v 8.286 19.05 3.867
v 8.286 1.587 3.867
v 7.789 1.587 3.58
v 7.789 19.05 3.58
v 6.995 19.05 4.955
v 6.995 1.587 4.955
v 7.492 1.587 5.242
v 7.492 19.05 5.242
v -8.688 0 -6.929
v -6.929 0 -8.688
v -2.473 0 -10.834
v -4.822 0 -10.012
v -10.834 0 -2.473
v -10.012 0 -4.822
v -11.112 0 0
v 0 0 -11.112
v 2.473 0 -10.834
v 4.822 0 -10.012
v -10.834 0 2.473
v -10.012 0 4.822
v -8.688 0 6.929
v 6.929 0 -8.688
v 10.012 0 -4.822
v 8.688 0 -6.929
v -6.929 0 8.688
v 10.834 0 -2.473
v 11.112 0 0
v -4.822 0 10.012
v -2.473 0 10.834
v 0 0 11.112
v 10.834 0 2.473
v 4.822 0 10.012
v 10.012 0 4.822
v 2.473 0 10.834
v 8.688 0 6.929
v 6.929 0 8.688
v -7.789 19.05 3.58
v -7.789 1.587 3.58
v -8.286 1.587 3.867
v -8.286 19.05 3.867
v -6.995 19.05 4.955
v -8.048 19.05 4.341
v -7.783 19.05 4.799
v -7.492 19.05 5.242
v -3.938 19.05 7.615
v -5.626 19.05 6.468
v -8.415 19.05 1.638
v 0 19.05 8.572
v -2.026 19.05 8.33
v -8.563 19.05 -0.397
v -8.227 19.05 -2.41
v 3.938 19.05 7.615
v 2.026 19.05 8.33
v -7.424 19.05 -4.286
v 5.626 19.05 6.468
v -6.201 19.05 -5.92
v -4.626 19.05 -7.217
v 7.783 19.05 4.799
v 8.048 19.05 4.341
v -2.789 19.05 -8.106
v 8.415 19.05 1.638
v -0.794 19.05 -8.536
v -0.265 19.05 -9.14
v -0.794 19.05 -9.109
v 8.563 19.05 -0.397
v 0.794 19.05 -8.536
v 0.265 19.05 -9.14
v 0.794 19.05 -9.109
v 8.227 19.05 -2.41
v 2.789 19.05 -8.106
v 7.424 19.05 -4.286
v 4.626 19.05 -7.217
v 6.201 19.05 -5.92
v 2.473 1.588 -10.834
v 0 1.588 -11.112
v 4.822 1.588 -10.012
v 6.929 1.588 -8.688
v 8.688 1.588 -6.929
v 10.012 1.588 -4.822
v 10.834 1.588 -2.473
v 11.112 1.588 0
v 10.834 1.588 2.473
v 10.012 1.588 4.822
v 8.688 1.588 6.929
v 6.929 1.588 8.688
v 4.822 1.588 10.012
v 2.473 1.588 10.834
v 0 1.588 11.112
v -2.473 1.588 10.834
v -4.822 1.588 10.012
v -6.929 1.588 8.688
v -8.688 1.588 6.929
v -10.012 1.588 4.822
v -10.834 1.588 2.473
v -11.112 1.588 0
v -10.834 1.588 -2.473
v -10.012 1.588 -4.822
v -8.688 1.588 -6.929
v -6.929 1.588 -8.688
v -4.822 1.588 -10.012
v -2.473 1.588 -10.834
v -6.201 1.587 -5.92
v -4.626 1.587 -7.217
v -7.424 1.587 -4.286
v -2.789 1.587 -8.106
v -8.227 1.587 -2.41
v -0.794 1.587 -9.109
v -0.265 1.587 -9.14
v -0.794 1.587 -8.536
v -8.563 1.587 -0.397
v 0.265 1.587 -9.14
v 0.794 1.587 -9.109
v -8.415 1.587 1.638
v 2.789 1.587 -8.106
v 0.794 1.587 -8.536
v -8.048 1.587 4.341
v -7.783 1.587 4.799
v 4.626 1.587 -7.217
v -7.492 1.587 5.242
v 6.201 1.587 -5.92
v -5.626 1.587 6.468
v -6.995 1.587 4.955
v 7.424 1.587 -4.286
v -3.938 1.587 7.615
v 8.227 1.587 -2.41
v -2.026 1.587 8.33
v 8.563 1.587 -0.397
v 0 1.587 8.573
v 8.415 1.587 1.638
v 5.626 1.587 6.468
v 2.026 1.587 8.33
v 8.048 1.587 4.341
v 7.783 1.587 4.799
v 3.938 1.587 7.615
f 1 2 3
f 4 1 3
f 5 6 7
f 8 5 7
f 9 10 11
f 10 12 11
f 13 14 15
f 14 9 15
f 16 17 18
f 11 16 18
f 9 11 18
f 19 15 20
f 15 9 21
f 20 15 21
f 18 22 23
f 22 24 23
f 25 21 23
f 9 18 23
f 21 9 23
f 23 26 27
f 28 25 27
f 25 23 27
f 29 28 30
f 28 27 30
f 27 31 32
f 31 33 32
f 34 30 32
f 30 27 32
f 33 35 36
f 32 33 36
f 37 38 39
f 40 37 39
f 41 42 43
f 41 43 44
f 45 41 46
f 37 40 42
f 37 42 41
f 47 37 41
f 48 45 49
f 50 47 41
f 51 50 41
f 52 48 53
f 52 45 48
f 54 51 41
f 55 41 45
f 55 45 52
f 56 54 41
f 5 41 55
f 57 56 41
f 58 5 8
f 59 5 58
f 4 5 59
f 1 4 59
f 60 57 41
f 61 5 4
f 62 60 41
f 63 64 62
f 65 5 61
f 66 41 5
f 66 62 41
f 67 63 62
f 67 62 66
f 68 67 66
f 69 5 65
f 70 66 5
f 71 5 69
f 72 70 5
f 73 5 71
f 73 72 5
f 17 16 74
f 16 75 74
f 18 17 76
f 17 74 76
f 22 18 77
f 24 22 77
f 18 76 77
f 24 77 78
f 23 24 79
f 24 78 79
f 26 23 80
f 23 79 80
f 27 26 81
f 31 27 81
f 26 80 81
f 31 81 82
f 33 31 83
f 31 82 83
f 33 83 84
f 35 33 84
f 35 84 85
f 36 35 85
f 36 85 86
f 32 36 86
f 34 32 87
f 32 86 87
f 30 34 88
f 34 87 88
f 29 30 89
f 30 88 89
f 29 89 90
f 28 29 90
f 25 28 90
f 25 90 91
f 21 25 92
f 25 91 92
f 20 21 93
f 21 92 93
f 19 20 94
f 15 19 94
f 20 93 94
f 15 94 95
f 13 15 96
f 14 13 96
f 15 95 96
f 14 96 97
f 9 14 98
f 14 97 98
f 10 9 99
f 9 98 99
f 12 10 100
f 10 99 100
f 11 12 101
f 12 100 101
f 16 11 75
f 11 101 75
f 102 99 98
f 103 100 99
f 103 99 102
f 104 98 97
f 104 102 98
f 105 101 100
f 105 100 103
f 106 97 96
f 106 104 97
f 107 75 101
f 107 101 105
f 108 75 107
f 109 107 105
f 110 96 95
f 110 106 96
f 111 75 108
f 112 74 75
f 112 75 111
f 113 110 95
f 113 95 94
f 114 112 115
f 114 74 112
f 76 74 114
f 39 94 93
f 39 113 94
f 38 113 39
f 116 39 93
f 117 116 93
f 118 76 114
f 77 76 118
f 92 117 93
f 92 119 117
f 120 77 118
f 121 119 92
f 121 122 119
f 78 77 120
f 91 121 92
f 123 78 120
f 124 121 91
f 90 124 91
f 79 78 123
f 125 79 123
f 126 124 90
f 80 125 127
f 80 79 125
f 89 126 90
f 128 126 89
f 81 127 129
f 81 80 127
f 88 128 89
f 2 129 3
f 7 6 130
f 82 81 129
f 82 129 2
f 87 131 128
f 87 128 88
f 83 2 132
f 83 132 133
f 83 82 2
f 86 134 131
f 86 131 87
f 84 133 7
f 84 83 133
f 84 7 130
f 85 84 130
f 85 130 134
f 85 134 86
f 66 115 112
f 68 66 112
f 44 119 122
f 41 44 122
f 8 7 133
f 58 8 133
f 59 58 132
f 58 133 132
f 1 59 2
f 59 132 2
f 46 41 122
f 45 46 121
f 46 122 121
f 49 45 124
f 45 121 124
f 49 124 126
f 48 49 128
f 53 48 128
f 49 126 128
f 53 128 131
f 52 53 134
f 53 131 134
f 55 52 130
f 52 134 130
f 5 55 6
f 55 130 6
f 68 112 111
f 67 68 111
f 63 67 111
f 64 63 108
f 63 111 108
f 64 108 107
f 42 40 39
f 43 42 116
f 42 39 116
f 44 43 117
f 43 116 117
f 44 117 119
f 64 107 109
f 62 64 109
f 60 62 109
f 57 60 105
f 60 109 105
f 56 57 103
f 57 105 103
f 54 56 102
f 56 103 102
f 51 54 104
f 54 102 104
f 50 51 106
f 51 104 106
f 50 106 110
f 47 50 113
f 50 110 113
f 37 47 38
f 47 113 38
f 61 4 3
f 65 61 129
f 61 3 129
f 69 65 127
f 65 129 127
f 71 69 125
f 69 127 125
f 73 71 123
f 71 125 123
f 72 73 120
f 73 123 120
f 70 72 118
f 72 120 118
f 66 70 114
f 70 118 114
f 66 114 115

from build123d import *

# Parameters (mm, degrees)
BOSS_EXTRUDE1_DEPTH = 19.05
SKETCH6_W           = 0.608326788
SKETCH6_H           = 1.5875
SKETCH8_W           = 2.576826788
SKETCH8_H           = 1.5875


with BuildPart() as part:
    # Sketch1 → Boss-Extrude1 (new body)
    with BuildSketch(Plane(origin=(0, 0, 0), x_dir=(1, 0, 0), z_dir=(0, 1, 0))):
        with BuildLine():
            Line((-0.79375, 9.109483901), (-0.79375, 8.535673212))
            ThreePointArc((-0.79375, 8.535673212), (-7.424002774, 4.28625), (-7.78898484, -3.580428942))
            Line((-7.78898484, -3.580428942), (-8.285919473, -3.867334286))
            ThreePointArc((-8.285919473, -3.867334286), (-7.918936292, -4.572), (-7.492169473, -5.242149615))
            Line((-7.492169473, -5.242149615), (-6.99523484, -4.95524427))
            ThreePointArc((-6.99523484, -4.95524427), (0, -8.5725), (6.99523484, -4.95524427))
            Line((6.99523484, -4.95524427), (7.492169473, -5.242149615))
            ThreePointArc((7.492169473, -5.242149615), (7.918936292, -4.572), (8.285919473, -3.867334286))
            Line((8.285919473, -3.867334286), (7.78898484, -3.580428942))
            ThreePointArc((7.78898484, -3.580428942), (7.424002774, 4.28625), (0.79375, 8.535673212))
            Line((0.79375, 8.535673212), (0.79375, 9.109483901))
            ThreePointArc((0.79375, 9.109483901), (0, 9.144), (-0.79375, 9.109483901))
        make_face()
    extrude(amount=BOSS_EXTRUDE1_DEPTH)

    # Sketch6 → Cut-Revolve2 (revolve, cut)
    with BuildSketch(Plane(origin=(0, 0, 0), x_dir=(0, 0, -1), z_dir=(1, 0, 0))):
        with Locations((8.839836606, 0.79375)):
            Rectangle(SKETCH6_W, SKETCH6_H)
    revolve(axis=Axis((0, 19.730213777, 0), (0, -1, 0)), mode=Mode.SUBTRACT)

    # Sketch8 → Revolve2 (revolve)
    with BuildSketch(Plane(origin=(0, 0, 0), x_dir=(0, 0, -1), z_dir=(1, 0, 0))):
        with Locations((9.824086606, 0.79375)):
            Rectangle(SKETCH8_W, SKETCH8_H)
    revolve(axis=Axis((0, 4.48386458, 0), (0, -1, 0)))


solid = part.part
